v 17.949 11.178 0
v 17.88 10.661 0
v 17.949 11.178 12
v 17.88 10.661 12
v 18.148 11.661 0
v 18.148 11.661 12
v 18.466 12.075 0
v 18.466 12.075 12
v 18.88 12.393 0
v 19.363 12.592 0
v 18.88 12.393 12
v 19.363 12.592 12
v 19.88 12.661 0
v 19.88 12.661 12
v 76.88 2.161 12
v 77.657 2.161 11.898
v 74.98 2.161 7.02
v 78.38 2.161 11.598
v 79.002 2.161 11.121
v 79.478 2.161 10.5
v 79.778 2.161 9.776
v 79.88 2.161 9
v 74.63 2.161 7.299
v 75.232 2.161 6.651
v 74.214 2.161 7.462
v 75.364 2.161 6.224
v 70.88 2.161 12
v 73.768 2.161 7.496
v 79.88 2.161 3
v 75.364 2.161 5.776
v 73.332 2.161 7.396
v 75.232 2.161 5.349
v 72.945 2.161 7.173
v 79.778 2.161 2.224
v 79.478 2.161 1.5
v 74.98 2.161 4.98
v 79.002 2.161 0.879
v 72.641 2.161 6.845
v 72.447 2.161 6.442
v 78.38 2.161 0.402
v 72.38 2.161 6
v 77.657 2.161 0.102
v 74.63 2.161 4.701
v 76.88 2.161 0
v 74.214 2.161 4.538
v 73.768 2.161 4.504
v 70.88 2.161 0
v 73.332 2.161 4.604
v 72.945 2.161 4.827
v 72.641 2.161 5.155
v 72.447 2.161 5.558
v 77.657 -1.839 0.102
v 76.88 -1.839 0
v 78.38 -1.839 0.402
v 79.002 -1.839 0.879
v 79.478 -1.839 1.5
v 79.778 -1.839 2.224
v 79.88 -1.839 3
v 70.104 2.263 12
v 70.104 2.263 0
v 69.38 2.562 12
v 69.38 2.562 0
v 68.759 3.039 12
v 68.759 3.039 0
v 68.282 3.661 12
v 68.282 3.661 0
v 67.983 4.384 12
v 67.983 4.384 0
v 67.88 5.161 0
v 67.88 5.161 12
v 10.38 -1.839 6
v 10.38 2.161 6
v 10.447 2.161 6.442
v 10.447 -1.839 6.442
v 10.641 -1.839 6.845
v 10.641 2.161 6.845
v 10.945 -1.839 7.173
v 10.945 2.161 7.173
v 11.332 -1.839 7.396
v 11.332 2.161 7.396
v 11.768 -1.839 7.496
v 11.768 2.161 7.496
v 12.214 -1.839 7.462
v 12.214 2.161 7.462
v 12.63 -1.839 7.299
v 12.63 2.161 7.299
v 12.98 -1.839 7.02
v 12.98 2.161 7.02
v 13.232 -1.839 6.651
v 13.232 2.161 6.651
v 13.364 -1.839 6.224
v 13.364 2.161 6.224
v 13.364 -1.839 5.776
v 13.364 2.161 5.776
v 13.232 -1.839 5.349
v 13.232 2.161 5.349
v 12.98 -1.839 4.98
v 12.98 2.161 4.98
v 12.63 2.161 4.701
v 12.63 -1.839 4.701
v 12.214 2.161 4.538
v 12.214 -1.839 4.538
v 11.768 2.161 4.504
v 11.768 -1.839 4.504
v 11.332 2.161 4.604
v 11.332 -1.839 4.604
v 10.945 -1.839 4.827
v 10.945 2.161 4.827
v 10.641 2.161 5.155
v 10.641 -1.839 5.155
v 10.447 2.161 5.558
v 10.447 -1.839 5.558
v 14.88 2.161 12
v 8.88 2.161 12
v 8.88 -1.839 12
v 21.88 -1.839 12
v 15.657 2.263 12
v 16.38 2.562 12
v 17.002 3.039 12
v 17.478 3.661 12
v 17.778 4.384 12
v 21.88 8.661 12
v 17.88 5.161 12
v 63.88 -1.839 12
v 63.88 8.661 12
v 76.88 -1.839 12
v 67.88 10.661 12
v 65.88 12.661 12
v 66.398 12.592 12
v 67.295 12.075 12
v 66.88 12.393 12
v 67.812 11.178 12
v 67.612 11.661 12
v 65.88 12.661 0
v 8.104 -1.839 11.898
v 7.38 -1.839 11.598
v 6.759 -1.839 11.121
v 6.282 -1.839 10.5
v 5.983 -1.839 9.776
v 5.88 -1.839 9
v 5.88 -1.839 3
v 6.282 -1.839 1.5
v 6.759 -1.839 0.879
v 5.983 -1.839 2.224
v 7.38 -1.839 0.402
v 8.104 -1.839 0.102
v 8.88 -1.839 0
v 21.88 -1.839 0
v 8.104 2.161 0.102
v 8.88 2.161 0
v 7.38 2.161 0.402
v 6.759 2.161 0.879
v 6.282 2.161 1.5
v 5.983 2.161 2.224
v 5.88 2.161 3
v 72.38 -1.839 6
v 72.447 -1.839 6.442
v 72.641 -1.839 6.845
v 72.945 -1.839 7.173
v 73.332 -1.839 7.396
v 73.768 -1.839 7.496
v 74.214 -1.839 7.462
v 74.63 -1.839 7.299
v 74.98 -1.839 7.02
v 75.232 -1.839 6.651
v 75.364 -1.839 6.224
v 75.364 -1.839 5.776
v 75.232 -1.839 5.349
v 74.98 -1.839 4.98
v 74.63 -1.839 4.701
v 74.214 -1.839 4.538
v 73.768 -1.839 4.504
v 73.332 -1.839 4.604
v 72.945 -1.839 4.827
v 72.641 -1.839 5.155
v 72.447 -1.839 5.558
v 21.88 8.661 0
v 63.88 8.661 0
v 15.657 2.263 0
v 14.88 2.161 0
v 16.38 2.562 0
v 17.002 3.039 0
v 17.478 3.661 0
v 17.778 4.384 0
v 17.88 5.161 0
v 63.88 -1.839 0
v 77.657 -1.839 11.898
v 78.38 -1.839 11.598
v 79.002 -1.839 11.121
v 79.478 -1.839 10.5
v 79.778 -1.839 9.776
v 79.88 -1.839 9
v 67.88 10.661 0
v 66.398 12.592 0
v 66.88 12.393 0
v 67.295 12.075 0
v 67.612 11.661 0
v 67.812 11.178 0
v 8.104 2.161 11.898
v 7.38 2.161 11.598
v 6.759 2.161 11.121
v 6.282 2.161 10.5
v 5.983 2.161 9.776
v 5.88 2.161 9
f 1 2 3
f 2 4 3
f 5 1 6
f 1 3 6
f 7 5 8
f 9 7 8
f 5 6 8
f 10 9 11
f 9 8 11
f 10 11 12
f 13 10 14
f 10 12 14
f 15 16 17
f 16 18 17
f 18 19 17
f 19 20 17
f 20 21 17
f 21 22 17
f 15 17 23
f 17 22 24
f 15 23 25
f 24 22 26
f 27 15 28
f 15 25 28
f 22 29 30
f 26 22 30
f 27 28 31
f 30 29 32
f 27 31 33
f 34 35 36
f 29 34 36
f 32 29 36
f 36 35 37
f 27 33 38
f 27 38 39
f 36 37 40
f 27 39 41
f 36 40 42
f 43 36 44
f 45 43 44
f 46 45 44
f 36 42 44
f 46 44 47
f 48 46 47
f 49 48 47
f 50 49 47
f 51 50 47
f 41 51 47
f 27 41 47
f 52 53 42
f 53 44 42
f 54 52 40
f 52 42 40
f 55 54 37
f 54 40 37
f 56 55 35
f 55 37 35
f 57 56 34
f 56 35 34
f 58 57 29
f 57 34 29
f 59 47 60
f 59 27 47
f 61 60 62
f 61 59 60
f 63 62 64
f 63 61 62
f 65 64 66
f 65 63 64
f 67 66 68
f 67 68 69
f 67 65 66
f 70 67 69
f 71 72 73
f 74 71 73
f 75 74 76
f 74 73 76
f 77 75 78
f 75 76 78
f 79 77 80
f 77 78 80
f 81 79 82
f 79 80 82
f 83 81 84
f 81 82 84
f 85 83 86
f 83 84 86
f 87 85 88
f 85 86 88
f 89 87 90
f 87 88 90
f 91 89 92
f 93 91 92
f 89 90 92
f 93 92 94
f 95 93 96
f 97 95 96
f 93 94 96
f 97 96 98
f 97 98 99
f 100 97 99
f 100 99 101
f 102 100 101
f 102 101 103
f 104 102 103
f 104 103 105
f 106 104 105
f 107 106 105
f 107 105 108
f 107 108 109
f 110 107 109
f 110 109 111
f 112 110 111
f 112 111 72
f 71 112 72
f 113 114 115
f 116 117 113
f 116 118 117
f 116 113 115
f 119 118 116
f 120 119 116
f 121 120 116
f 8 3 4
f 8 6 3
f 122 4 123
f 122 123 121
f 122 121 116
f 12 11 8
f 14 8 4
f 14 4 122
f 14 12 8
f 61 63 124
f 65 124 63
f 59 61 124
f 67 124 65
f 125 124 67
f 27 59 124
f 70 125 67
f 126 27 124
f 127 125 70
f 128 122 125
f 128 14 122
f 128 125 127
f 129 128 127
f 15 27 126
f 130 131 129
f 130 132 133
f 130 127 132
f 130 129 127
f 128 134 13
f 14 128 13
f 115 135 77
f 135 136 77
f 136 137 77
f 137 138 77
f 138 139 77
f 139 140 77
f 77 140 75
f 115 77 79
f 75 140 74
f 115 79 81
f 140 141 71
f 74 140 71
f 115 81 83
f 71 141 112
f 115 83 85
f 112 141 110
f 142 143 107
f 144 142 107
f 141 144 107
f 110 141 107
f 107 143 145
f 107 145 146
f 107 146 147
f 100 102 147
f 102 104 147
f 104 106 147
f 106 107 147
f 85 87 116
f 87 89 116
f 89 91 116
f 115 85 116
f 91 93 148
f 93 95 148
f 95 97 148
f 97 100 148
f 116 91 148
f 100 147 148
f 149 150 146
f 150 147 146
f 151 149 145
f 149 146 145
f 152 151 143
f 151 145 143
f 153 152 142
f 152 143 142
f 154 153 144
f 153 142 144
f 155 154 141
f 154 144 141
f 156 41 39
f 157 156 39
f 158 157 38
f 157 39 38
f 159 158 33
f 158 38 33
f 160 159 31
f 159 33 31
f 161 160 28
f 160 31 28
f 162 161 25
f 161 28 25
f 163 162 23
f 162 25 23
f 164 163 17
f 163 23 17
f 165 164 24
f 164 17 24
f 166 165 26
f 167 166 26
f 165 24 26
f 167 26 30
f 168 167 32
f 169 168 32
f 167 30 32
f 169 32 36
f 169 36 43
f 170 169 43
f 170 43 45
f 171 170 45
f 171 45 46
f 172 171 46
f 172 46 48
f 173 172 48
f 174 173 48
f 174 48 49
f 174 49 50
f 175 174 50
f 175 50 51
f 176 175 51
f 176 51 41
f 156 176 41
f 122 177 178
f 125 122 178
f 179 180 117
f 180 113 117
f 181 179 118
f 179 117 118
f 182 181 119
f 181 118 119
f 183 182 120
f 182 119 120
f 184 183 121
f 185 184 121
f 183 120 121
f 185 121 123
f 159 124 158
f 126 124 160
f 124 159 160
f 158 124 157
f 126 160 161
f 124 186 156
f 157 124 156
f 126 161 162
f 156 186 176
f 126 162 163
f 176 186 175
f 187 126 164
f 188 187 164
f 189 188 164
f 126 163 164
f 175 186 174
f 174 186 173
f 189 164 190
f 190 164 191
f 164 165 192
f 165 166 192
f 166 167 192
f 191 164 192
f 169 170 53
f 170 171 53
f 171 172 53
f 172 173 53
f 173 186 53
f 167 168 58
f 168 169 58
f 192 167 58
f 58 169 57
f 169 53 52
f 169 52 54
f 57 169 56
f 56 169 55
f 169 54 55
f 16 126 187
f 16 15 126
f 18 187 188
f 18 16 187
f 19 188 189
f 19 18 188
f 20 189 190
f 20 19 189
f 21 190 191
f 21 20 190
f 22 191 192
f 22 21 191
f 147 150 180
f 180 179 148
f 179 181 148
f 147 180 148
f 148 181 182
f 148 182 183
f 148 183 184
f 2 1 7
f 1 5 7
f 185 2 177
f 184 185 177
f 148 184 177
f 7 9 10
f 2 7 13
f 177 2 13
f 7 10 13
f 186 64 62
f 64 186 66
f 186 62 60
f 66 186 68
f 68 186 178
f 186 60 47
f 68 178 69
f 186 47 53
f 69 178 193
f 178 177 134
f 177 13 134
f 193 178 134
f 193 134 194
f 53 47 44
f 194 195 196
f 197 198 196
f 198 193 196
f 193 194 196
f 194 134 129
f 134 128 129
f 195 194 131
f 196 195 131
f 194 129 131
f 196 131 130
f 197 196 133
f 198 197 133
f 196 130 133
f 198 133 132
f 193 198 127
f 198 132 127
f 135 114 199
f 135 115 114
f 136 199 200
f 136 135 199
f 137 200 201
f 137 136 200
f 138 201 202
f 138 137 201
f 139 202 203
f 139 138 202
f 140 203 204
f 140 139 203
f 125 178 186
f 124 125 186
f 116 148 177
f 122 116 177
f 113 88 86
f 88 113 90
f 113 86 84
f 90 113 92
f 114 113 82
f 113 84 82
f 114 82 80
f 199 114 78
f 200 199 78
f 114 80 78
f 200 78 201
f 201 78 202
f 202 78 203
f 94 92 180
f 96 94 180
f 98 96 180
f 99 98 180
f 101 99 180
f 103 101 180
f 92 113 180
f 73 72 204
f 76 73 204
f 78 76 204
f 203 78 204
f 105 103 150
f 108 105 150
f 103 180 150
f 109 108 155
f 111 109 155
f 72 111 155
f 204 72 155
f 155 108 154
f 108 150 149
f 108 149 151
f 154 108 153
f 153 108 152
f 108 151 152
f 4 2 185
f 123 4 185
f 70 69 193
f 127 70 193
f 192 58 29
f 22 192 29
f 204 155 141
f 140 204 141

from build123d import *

# Parameters (mm, degrees)
F1_DEPTH = 12
F3_D     = 3
F3_DEPTH = 25
F4_R     = 3
F5_R     = 2


with BuildPart() as f1:
    # F0 (on Top) → F1 (new body)
    with BuildSketch(Plane.XY):
        Polygon((17.880361, 2.160541), (5.880361, 2.160541), (5.880361, -1.839459), (21.880361, -1.839459), (21.880361, 8.660541), (63.880361, 8.660541), (63.880361, -1.839459), (79.880361, -1.839459), (79.880361, 2.160541), (67.880361, 2.160541), (67.880361, 12.660541), (17.880361, 12.660541), align=None)
    extrude(amount=F1_DEPTH)

    # F3
    with Locations(Plane.XZ.offset(1.839459)):
        with Locations((11.880361, 6), (73.880361, 6)):
            Hole(F3_D / 2, depth=F3_DEPTH)

    # F4
    f4_edges = [f1.edges().sort_by_distance(p)[0] for p in [
        (67.880361, 2.160541, 6),
        (79.880361, 0.160541, 12),
        (79.880361, 0.160541, 0),
        (5.880361, 0.160541, 0),
        (17.880361, 2.160541, 6),
        (5.880361, 0.160541, 12),
    ]]
    fillet(f4_edges, radius=F4_R)

    # F5
    f5_edges = [f1.edges().sort_by_distance(p)[0] for p in [
        (17.880361, 12.660541, 6),
        (67.880361, 12.660541, 6),
    ]]
    fillet(f5_edges, radius=F5_R)


solid = f1.part
